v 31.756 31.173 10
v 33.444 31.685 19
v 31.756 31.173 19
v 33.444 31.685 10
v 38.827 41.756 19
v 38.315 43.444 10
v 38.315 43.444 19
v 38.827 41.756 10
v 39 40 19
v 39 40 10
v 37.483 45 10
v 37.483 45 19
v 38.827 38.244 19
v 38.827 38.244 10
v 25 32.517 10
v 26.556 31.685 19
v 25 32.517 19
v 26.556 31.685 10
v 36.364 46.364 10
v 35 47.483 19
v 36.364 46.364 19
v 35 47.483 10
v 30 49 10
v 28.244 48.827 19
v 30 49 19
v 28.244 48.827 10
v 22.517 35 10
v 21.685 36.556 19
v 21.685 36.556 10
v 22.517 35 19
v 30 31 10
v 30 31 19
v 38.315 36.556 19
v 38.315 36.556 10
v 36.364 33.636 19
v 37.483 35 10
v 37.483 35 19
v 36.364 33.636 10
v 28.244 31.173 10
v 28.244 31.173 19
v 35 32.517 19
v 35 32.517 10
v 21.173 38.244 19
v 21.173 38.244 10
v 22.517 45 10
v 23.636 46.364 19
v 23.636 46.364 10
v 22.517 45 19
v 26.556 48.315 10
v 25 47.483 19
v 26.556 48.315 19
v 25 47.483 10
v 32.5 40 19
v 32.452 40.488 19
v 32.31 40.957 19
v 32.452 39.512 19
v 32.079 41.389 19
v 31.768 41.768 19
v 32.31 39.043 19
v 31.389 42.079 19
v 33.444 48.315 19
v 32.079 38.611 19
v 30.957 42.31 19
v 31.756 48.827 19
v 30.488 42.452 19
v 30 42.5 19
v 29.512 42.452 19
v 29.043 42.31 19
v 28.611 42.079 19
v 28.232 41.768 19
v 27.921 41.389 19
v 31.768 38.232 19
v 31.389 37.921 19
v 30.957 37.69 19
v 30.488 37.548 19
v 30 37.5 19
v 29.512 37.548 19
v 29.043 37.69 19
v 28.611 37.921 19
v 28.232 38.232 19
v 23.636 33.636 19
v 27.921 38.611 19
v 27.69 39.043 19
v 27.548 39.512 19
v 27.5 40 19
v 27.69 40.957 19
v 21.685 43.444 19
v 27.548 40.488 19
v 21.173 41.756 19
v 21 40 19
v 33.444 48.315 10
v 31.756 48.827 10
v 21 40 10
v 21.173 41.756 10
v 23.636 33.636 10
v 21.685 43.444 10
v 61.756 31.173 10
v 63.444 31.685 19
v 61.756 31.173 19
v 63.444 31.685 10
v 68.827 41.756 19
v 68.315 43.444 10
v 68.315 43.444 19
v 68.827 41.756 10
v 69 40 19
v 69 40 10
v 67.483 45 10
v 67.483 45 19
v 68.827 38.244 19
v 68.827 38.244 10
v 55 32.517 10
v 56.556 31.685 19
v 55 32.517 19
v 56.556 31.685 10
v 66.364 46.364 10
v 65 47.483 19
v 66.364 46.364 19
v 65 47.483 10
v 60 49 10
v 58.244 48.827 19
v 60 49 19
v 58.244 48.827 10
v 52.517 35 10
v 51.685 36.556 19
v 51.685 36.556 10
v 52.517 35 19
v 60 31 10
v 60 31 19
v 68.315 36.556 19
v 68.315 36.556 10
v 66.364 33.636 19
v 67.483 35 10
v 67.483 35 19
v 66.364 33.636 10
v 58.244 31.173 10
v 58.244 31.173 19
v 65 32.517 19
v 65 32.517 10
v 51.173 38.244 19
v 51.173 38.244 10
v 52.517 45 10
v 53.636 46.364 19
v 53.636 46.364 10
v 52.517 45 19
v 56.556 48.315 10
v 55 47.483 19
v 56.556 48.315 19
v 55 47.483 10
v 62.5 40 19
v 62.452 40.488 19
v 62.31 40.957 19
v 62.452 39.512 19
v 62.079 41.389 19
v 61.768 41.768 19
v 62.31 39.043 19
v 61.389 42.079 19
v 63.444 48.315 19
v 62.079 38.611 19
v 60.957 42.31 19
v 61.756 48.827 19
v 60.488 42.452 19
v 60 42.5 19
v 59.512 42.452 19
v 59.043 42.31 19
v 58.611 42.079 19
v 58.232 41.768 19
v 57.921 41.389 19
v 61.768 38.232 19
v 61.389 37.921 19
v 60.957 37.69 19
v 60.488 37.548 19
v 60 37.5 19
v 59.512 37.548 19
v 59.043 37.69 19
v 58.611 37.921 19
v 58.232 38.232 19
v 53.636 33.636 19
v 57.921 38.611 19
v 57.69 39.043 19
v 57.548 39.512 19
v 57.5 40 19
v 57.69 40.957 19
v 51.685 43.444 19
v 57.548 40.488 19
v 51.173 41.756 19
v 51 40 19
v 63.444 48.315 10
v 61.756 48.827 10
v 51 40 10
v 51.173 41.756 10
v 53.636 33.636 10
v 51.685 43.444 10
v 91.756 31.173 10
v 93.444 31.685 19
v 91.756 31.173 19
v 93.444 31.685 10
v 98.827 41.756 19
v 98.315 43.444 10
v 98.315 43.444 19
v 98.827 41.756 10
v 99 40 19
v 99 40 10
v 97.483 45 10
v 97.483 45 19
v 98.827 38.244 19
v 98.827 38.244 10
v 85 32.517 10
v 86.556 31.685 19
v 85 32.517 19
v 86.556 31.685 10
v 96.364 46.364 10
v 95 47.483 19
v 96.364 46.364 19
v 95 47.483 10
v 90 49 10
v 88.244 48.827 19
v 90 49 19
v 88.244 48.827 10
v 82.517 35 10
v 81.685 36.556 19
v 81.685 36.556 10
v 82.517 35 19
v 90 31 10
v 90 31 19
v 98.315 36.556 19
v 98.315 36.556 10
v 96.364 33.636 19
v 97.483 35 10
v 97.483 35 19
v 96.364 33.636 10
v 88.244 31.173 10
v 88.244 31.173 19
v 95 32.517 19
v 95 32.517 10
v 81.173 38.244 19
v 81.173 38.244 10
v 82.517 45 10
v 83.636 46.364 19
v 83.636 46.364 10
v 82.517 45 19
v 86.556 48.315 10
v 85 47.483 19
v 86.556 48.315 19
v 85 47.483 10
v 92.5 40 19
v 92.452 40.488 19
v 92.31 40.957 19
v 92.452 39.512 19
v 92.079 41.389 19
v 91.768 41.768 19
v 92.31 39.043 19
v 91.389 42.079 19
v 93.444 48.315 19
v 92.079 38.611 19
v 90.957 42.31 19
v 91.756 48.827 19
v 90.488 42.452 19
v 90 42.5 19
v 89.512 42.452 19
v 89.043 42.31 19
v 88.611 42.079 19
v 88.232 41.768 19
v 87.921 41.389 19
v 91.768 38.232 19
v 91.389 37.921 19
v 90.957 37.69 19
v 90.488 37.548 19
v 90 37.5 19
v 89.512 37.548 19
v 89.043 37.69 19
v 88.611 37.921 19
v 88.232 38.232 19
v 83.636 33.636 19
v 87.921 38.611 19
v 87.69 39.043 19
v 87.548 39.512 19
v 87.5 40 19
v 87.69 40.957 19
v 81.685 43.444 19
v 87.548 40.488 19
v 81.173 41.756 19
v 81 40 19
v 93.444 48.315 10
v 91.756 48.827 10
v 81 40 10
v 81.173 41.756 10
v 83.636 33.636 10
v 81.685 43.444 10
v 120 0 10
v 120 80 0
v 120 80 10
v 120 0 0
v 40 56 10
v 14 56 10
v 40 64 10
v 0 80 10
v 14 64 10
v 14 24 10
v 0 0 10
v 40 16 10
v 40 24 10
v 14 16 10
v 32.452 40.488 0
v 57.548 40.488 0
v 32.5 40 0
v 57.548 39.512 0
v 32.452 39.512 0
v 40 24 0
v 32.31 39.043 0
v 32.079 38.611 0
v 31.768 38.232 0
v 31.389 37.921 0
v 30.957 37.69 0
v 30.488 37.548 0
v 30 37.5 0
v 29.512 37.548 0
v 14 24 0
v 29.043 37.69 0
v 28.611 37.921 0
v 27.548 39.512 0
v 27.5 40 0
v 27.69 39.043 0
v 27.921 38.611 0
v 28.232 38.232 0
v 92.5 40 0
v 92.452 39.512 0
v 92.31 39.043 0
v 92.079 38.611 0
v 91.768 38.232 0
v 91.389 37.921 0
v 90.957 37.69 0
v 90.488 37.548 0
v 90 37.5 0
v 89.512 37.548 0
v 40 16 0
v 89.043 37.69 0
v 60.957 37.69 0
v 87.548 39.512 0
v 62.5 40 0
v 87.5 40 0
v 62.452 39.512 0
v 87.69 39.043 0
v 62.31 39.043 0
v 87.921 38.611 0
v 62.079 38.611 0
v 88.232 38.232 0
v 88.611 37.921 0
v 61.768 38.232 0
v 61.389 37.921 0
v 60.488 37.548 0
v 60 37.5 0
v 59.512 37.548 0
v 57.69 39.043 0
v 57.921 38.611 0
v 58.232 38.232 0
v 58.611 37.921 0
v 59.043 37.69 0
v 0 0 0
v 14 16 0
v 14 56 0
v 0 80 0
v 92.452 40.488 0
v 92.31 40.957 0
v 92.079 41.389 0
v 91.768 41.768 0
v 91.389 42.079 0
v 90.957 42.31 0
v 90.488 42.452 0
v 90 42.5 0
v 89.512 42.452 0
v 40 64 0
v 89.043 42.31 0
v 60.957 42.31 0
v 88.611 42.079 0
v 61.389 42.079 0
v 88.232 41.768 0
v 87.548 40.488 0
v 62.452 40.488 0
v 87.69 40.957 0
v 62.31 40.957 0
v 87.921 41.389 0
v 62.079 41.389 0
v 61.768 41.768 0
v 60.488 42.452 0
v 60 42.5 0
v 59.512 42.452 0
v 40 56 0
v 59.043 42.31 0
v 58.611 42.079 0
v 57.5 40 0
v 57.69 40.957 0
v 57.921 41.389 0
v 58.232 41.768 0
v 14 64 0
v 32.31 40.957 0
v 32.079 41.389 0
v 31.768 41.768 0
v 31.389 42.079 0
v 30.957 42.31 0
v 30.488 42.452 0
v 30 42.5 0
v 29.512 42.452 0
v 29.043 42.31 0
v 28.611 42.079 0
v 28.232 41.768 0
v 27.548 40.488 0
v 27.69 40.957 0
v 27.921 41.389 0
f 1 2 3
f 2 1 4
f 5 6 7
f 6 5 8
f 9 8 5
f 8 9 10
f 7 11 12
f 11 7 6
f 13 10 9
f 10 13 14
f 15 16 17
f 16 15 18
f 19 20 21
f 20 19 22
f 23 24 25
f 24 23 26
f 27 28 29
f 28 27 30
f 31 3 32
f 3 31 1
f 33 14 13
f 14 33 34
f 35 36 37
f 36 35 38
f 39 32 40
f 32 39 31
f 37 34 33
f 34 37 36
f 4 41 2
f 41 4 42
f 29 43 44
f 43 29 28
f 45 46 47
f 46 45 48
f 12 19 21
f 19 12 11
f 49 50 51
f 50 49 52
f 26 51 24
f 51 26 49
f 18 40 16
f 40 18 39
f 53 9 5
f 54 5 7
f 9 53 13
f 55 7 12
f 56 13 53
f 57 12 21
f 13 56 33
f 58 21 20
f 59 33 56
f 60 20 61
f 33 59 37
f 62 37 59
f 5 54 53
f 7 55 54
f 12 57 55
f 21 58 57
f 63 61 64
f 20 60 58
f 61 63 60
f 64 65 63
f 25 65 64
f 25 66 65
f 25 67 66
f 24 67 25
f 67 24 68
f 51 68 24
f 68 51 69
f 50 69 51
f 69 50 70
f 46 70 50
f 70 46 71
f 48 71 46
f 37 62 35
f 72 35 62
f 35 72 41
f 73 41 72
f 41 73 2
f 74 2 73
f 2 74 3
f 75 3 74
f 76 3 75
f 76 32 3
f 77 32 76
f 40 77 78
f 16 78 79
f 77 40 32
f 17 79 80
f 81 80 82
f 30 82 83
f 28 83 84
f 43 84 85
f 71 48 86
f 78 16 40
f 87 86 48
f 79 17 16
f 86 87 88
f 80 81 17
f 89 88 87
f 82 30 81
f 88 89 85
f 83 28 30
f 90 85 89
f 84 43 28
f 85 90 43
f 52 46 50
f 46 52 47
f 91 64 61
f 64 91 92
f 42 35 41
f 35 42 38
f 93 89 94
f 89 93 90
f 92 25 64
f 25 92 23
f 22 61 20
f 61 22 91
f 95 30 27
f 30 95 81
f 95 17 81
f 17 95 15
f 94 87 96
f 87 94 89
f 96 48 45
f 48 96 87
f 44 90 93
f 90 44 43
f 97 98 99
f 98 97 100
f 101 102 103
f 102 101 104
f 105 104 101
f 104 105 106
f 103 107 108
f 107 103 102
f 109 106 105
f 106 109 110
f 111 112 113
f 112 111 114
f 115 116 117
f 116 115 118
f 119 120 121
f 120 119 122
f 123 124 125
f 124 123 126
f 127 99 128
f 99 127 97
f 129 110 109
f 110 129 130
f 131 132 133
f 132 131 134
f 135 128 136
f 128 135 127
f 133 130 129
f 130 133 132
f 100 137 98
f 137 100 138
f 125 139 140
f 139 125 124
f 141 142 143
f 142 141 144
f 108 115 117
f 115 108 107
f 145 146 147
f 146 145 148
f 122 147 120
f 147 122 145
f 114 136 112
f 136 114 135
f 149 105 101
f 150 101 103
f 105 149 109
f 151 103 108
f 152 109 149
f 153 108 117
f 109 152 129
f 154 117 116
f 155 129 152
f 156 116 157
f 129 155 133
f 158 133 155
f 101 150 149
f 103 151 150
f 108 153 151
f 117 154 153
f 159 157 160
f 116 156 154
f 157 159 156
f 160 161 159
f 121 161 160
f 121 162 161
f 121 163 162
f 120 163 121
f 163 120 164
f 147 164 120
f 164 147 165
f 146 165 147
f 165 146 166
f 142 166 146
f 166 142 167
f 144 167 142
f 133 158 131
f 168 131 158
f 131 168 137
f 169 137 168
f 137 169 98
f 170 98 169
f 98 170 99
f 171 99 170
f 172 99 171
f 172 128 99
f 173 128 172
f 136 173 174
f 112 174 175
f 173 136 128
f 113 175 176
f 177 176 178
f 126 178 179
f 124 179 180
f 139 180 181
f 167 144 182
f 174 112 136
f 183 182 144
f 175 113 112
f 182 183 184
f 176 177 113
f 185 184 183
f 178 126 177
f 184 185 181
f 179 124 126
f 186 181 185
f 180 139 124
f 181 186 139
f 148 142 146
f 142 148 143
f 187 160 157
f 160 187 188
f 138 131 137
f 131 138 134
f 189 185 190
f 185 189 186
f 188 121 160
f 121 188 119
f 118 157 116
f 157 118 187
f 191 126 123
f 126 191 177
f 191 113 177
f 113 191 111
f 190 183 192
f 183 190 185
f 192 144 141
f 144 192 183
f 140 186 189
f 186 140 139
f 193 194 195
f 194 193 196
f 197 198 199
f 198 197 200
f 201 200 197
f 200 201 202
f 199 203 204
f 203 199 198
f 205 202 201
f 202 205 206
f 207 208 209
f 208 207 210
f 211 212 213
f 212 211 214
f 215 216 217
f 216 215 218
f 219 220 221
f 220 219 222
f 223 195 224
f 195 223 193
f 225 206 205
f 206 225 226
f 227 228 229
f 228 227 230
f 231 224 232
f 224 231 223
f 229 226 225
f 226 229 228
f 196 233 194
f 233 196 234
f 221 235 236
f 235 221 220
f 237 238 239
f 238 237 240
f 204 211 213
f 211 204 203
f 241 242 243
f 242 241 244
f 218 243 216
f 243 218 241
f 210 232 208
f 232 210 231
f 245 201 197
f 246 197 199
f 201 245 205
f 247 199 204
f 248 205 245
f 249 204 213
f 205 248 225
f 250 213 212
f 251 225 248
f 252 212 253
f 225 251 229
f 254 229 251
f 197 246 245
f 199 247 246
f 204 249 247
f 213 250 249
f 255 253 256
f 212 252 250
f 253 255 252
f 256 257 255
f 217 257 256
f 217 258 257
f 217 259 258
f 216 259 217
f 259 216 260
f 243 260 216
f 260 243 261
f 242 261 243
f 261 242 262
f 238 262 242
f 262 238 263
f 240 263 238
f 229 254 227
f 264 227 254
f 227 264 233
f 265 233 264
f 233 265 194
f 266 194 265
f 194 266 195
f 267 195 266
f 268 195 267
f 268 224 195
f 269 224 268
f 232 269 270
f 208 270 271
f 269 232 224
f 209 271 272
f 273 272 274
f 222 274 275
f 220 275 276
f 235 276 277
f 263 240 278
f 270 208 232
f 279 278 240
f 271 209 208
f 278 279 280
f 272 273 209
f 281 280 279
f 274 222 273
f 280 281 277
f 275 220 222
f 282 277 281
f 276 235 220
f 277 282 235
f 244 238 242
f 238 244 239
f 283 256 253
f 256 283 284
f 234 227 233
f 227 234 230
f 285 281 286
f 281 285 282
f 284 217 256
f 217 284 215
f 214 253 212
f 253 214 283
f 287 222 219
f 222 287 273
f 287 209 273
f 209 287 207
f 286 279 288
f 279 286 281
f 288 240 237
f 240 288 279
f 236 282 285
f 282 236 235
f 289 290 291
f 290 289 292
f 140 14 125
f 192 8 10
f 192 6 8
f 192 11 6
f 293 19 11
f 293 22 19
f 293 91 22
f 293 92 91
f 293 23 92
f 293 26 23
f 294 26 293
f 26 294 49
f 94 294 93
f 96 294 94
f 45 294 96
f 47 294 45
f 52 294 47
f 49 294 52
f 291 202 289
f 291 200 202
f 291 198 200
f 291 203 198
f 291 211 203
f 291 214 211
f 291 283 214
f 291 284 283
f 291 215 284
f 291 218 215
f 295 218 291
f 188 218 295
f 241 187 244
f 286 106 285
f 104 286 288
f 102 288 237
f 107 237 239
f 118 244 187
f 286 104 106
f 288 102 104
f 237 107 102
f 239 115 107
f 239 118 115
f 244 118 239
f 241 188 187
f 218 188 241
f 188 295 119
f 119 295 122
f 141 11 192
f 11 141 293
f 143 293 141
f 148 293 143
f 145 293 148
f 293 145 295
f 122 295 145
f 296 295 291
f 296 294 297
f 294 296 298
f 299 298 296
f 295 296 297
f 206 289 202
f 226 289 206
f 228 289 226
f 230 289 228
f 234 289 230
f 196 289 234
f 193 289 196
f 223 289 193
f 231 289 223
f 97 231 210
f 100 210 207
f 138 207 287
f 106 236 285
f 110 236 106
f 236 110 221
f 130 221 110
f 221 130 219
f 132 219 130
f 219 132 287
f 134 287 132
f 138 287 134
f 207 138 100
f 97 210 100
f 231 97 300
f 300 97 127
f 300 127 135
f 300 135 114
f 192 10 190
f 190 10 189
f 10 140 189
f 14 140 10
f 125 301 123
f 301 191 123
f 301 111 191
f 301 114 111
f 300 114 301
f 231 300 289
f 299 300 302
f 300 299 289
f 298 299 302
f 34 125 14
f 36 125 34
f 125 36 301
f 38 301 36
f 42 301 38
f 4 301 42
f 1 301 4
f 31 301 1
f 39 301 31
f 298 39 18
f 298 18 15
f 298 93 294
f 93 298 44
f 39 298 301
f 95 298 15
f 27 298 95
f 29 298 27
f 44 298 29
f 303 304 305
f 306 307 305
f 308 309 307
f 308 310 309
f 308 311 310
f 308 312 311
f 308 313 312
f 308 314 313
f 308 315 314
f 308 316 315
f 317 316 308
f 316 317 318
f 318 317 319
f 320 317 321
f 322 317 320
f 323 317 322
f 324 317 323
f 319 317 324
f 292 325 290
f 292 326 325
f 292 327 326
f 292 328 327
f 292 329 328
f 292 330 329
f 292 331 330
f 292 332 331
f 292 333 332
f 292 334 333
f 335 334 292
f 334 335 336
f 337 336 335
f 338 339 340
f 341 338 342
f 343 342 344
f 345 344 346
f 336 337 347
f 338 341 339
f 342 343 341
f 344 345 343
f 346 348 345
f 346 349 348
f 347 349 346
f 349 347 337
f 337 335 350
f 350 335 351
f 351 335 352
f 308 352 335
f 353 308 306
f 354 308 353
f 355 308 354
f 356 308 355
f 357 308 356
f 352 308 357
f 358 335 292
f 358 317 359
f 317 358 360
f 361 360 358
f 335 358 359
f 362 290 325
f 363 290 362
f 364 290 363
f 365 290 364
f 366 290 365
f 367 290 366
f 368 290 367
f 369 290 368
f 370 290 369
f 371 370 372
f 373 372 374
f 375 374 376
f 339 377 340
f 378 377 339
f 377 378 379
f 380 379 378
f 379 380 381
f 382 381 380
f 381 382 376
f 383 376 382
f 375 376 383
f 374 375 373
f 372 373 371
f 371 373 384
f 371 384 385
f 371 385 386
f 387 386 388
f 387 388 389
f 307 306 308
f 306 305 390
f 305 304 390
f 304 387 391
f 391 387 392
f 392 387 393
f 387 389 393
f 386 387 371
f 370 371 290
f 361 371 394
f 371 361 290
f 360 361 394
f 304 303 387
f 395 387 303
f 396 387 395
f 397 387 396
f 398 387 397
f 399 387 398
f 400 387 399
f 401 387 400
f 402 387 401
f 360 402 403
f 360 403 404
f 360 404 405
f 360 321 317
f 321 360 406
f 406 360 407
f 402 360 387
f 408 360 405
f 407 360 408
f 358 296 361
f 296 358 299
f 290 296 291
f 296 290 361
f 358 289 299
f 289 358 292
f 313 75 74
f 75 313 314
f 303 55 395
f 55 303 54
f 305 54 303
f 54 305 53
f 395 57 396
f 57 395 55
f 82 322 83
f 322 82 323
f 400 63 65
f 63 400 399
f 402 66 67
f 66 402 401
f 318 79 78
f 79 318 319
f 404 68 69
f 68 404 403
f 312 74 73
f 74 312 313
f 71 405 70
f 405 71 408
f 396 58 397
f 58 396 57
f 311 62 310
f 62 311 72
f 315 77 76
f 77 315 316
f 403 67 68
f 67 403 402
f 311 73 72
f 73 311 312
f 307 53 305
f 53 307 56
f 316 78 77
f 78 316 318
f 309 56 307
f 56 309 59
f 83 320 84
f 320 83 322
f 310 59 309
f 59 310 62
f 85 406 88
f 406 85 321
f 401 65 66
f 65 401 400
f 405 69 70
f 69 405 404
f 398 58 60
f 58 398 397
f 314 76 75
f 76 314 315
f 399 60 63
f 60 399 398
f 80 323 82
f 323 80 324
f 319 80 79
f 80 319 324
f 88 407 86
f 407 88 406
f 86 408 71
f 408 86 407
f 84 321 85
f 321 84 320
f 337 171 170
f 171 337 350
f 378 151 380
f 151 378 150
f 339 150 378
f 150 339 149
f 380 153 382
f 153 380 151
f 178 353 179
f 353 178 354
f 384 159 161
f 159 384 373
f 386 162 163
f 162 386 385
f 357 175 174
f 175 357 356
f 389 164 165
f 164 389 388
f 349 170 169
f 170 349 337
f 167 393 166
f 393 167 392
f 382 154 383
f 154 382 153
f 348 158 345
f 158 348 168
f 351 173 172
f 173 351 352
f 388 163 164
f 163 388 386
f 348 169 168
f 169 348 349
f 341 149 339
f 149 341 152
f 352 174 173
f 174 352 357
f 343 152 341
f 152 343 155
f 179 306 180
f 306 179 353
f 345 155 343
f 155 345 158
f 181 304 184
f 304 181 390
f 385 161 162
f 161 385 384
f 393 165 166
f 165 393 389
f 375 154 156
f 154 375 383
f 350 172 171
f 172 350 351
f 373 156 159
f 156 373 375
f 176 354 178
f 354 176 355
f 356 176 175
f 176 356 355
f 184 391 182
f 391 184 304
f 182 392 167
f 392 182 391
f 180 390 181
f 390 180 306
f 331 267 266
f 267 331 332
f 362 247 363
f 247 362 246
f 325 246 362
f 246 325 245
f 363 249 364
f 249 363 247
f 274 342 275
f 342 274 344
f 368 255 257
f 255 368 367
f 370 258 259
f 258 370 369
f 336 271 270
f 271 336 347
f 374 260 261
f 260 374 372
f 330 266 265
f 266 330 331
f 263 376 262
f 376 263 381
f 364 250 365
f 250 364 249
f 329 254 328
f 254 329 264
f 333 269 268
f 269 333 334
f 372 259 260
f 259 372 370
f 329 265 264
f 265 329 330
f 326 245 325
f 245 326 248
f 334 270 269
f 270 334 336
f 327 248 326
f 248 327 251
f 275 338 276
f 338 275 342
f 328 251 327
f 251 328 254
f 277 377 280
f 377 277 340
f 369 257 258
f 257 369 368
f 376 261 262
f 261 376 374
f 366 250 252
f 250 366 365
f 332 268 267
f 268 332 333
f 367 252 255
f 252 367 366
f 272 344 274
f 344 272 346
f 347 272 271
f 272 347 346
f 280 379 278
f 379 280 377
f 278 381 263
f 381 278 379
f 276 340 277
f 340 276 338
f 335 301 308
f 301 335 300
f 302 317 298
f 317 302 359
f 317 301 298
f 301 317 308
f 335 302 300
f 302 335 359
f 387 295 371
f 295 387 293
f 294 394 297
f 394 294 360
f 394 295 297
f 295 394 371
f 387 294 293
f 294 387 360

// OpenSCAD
$fn = 32;

// ----------------------------------------------------------------------
// Drill jig: three_boss_slot jig
// ----------------------------------------------------------------------

// --- parameters (mm) ---
plate_l = 120;            // plate length, X
plate_w = 80;             // plate width, Y
plate_t = 10;             // plate thickness
boss_d = 18;              // guide boss diameter
boss_h = 10;              // boss height above the plate
guide_d = 5;              // guide hole diameter
boss_pitch = 30;          // boss pitch
slot_w = 8;               // clamp slot width
slot_l = 26;              // clamp slot length
slot_x = 14;              // slot start X

n_boss = 3;  // guide bosses
boss_x0 = (plate_l - (n_boss - 1) * boss_pitch) / 2;  // first boss X
boss_top = plate_t - 1 + boss_h;  // boss crown height
total_h = boss_top;  // overall height

difference() {
  union() {
  cube([plate_l, plate_w, plate_t]);
  for (i = [0 : n_boss - 1])
    translate([boss_x0 + i * boss_pitch, plate_w / 2, plate_t - 1])
      cylinder(h = boss_h, d = boss_d);
  }
  for (i = [0 : n_boss - 1])
    translate([boss_x0 + i * boss_pitch, plate_w / 2, -1])
      cylinder(h = plate_t + boss_h, d = guide_d);
  for (cy = [plate_w * 0.25, plate_w * 0.75])
    translate([slot_x, cy - slot_w / 2, -1])
      cube([slot_l, slot_w, plate_t + 2]);
}
